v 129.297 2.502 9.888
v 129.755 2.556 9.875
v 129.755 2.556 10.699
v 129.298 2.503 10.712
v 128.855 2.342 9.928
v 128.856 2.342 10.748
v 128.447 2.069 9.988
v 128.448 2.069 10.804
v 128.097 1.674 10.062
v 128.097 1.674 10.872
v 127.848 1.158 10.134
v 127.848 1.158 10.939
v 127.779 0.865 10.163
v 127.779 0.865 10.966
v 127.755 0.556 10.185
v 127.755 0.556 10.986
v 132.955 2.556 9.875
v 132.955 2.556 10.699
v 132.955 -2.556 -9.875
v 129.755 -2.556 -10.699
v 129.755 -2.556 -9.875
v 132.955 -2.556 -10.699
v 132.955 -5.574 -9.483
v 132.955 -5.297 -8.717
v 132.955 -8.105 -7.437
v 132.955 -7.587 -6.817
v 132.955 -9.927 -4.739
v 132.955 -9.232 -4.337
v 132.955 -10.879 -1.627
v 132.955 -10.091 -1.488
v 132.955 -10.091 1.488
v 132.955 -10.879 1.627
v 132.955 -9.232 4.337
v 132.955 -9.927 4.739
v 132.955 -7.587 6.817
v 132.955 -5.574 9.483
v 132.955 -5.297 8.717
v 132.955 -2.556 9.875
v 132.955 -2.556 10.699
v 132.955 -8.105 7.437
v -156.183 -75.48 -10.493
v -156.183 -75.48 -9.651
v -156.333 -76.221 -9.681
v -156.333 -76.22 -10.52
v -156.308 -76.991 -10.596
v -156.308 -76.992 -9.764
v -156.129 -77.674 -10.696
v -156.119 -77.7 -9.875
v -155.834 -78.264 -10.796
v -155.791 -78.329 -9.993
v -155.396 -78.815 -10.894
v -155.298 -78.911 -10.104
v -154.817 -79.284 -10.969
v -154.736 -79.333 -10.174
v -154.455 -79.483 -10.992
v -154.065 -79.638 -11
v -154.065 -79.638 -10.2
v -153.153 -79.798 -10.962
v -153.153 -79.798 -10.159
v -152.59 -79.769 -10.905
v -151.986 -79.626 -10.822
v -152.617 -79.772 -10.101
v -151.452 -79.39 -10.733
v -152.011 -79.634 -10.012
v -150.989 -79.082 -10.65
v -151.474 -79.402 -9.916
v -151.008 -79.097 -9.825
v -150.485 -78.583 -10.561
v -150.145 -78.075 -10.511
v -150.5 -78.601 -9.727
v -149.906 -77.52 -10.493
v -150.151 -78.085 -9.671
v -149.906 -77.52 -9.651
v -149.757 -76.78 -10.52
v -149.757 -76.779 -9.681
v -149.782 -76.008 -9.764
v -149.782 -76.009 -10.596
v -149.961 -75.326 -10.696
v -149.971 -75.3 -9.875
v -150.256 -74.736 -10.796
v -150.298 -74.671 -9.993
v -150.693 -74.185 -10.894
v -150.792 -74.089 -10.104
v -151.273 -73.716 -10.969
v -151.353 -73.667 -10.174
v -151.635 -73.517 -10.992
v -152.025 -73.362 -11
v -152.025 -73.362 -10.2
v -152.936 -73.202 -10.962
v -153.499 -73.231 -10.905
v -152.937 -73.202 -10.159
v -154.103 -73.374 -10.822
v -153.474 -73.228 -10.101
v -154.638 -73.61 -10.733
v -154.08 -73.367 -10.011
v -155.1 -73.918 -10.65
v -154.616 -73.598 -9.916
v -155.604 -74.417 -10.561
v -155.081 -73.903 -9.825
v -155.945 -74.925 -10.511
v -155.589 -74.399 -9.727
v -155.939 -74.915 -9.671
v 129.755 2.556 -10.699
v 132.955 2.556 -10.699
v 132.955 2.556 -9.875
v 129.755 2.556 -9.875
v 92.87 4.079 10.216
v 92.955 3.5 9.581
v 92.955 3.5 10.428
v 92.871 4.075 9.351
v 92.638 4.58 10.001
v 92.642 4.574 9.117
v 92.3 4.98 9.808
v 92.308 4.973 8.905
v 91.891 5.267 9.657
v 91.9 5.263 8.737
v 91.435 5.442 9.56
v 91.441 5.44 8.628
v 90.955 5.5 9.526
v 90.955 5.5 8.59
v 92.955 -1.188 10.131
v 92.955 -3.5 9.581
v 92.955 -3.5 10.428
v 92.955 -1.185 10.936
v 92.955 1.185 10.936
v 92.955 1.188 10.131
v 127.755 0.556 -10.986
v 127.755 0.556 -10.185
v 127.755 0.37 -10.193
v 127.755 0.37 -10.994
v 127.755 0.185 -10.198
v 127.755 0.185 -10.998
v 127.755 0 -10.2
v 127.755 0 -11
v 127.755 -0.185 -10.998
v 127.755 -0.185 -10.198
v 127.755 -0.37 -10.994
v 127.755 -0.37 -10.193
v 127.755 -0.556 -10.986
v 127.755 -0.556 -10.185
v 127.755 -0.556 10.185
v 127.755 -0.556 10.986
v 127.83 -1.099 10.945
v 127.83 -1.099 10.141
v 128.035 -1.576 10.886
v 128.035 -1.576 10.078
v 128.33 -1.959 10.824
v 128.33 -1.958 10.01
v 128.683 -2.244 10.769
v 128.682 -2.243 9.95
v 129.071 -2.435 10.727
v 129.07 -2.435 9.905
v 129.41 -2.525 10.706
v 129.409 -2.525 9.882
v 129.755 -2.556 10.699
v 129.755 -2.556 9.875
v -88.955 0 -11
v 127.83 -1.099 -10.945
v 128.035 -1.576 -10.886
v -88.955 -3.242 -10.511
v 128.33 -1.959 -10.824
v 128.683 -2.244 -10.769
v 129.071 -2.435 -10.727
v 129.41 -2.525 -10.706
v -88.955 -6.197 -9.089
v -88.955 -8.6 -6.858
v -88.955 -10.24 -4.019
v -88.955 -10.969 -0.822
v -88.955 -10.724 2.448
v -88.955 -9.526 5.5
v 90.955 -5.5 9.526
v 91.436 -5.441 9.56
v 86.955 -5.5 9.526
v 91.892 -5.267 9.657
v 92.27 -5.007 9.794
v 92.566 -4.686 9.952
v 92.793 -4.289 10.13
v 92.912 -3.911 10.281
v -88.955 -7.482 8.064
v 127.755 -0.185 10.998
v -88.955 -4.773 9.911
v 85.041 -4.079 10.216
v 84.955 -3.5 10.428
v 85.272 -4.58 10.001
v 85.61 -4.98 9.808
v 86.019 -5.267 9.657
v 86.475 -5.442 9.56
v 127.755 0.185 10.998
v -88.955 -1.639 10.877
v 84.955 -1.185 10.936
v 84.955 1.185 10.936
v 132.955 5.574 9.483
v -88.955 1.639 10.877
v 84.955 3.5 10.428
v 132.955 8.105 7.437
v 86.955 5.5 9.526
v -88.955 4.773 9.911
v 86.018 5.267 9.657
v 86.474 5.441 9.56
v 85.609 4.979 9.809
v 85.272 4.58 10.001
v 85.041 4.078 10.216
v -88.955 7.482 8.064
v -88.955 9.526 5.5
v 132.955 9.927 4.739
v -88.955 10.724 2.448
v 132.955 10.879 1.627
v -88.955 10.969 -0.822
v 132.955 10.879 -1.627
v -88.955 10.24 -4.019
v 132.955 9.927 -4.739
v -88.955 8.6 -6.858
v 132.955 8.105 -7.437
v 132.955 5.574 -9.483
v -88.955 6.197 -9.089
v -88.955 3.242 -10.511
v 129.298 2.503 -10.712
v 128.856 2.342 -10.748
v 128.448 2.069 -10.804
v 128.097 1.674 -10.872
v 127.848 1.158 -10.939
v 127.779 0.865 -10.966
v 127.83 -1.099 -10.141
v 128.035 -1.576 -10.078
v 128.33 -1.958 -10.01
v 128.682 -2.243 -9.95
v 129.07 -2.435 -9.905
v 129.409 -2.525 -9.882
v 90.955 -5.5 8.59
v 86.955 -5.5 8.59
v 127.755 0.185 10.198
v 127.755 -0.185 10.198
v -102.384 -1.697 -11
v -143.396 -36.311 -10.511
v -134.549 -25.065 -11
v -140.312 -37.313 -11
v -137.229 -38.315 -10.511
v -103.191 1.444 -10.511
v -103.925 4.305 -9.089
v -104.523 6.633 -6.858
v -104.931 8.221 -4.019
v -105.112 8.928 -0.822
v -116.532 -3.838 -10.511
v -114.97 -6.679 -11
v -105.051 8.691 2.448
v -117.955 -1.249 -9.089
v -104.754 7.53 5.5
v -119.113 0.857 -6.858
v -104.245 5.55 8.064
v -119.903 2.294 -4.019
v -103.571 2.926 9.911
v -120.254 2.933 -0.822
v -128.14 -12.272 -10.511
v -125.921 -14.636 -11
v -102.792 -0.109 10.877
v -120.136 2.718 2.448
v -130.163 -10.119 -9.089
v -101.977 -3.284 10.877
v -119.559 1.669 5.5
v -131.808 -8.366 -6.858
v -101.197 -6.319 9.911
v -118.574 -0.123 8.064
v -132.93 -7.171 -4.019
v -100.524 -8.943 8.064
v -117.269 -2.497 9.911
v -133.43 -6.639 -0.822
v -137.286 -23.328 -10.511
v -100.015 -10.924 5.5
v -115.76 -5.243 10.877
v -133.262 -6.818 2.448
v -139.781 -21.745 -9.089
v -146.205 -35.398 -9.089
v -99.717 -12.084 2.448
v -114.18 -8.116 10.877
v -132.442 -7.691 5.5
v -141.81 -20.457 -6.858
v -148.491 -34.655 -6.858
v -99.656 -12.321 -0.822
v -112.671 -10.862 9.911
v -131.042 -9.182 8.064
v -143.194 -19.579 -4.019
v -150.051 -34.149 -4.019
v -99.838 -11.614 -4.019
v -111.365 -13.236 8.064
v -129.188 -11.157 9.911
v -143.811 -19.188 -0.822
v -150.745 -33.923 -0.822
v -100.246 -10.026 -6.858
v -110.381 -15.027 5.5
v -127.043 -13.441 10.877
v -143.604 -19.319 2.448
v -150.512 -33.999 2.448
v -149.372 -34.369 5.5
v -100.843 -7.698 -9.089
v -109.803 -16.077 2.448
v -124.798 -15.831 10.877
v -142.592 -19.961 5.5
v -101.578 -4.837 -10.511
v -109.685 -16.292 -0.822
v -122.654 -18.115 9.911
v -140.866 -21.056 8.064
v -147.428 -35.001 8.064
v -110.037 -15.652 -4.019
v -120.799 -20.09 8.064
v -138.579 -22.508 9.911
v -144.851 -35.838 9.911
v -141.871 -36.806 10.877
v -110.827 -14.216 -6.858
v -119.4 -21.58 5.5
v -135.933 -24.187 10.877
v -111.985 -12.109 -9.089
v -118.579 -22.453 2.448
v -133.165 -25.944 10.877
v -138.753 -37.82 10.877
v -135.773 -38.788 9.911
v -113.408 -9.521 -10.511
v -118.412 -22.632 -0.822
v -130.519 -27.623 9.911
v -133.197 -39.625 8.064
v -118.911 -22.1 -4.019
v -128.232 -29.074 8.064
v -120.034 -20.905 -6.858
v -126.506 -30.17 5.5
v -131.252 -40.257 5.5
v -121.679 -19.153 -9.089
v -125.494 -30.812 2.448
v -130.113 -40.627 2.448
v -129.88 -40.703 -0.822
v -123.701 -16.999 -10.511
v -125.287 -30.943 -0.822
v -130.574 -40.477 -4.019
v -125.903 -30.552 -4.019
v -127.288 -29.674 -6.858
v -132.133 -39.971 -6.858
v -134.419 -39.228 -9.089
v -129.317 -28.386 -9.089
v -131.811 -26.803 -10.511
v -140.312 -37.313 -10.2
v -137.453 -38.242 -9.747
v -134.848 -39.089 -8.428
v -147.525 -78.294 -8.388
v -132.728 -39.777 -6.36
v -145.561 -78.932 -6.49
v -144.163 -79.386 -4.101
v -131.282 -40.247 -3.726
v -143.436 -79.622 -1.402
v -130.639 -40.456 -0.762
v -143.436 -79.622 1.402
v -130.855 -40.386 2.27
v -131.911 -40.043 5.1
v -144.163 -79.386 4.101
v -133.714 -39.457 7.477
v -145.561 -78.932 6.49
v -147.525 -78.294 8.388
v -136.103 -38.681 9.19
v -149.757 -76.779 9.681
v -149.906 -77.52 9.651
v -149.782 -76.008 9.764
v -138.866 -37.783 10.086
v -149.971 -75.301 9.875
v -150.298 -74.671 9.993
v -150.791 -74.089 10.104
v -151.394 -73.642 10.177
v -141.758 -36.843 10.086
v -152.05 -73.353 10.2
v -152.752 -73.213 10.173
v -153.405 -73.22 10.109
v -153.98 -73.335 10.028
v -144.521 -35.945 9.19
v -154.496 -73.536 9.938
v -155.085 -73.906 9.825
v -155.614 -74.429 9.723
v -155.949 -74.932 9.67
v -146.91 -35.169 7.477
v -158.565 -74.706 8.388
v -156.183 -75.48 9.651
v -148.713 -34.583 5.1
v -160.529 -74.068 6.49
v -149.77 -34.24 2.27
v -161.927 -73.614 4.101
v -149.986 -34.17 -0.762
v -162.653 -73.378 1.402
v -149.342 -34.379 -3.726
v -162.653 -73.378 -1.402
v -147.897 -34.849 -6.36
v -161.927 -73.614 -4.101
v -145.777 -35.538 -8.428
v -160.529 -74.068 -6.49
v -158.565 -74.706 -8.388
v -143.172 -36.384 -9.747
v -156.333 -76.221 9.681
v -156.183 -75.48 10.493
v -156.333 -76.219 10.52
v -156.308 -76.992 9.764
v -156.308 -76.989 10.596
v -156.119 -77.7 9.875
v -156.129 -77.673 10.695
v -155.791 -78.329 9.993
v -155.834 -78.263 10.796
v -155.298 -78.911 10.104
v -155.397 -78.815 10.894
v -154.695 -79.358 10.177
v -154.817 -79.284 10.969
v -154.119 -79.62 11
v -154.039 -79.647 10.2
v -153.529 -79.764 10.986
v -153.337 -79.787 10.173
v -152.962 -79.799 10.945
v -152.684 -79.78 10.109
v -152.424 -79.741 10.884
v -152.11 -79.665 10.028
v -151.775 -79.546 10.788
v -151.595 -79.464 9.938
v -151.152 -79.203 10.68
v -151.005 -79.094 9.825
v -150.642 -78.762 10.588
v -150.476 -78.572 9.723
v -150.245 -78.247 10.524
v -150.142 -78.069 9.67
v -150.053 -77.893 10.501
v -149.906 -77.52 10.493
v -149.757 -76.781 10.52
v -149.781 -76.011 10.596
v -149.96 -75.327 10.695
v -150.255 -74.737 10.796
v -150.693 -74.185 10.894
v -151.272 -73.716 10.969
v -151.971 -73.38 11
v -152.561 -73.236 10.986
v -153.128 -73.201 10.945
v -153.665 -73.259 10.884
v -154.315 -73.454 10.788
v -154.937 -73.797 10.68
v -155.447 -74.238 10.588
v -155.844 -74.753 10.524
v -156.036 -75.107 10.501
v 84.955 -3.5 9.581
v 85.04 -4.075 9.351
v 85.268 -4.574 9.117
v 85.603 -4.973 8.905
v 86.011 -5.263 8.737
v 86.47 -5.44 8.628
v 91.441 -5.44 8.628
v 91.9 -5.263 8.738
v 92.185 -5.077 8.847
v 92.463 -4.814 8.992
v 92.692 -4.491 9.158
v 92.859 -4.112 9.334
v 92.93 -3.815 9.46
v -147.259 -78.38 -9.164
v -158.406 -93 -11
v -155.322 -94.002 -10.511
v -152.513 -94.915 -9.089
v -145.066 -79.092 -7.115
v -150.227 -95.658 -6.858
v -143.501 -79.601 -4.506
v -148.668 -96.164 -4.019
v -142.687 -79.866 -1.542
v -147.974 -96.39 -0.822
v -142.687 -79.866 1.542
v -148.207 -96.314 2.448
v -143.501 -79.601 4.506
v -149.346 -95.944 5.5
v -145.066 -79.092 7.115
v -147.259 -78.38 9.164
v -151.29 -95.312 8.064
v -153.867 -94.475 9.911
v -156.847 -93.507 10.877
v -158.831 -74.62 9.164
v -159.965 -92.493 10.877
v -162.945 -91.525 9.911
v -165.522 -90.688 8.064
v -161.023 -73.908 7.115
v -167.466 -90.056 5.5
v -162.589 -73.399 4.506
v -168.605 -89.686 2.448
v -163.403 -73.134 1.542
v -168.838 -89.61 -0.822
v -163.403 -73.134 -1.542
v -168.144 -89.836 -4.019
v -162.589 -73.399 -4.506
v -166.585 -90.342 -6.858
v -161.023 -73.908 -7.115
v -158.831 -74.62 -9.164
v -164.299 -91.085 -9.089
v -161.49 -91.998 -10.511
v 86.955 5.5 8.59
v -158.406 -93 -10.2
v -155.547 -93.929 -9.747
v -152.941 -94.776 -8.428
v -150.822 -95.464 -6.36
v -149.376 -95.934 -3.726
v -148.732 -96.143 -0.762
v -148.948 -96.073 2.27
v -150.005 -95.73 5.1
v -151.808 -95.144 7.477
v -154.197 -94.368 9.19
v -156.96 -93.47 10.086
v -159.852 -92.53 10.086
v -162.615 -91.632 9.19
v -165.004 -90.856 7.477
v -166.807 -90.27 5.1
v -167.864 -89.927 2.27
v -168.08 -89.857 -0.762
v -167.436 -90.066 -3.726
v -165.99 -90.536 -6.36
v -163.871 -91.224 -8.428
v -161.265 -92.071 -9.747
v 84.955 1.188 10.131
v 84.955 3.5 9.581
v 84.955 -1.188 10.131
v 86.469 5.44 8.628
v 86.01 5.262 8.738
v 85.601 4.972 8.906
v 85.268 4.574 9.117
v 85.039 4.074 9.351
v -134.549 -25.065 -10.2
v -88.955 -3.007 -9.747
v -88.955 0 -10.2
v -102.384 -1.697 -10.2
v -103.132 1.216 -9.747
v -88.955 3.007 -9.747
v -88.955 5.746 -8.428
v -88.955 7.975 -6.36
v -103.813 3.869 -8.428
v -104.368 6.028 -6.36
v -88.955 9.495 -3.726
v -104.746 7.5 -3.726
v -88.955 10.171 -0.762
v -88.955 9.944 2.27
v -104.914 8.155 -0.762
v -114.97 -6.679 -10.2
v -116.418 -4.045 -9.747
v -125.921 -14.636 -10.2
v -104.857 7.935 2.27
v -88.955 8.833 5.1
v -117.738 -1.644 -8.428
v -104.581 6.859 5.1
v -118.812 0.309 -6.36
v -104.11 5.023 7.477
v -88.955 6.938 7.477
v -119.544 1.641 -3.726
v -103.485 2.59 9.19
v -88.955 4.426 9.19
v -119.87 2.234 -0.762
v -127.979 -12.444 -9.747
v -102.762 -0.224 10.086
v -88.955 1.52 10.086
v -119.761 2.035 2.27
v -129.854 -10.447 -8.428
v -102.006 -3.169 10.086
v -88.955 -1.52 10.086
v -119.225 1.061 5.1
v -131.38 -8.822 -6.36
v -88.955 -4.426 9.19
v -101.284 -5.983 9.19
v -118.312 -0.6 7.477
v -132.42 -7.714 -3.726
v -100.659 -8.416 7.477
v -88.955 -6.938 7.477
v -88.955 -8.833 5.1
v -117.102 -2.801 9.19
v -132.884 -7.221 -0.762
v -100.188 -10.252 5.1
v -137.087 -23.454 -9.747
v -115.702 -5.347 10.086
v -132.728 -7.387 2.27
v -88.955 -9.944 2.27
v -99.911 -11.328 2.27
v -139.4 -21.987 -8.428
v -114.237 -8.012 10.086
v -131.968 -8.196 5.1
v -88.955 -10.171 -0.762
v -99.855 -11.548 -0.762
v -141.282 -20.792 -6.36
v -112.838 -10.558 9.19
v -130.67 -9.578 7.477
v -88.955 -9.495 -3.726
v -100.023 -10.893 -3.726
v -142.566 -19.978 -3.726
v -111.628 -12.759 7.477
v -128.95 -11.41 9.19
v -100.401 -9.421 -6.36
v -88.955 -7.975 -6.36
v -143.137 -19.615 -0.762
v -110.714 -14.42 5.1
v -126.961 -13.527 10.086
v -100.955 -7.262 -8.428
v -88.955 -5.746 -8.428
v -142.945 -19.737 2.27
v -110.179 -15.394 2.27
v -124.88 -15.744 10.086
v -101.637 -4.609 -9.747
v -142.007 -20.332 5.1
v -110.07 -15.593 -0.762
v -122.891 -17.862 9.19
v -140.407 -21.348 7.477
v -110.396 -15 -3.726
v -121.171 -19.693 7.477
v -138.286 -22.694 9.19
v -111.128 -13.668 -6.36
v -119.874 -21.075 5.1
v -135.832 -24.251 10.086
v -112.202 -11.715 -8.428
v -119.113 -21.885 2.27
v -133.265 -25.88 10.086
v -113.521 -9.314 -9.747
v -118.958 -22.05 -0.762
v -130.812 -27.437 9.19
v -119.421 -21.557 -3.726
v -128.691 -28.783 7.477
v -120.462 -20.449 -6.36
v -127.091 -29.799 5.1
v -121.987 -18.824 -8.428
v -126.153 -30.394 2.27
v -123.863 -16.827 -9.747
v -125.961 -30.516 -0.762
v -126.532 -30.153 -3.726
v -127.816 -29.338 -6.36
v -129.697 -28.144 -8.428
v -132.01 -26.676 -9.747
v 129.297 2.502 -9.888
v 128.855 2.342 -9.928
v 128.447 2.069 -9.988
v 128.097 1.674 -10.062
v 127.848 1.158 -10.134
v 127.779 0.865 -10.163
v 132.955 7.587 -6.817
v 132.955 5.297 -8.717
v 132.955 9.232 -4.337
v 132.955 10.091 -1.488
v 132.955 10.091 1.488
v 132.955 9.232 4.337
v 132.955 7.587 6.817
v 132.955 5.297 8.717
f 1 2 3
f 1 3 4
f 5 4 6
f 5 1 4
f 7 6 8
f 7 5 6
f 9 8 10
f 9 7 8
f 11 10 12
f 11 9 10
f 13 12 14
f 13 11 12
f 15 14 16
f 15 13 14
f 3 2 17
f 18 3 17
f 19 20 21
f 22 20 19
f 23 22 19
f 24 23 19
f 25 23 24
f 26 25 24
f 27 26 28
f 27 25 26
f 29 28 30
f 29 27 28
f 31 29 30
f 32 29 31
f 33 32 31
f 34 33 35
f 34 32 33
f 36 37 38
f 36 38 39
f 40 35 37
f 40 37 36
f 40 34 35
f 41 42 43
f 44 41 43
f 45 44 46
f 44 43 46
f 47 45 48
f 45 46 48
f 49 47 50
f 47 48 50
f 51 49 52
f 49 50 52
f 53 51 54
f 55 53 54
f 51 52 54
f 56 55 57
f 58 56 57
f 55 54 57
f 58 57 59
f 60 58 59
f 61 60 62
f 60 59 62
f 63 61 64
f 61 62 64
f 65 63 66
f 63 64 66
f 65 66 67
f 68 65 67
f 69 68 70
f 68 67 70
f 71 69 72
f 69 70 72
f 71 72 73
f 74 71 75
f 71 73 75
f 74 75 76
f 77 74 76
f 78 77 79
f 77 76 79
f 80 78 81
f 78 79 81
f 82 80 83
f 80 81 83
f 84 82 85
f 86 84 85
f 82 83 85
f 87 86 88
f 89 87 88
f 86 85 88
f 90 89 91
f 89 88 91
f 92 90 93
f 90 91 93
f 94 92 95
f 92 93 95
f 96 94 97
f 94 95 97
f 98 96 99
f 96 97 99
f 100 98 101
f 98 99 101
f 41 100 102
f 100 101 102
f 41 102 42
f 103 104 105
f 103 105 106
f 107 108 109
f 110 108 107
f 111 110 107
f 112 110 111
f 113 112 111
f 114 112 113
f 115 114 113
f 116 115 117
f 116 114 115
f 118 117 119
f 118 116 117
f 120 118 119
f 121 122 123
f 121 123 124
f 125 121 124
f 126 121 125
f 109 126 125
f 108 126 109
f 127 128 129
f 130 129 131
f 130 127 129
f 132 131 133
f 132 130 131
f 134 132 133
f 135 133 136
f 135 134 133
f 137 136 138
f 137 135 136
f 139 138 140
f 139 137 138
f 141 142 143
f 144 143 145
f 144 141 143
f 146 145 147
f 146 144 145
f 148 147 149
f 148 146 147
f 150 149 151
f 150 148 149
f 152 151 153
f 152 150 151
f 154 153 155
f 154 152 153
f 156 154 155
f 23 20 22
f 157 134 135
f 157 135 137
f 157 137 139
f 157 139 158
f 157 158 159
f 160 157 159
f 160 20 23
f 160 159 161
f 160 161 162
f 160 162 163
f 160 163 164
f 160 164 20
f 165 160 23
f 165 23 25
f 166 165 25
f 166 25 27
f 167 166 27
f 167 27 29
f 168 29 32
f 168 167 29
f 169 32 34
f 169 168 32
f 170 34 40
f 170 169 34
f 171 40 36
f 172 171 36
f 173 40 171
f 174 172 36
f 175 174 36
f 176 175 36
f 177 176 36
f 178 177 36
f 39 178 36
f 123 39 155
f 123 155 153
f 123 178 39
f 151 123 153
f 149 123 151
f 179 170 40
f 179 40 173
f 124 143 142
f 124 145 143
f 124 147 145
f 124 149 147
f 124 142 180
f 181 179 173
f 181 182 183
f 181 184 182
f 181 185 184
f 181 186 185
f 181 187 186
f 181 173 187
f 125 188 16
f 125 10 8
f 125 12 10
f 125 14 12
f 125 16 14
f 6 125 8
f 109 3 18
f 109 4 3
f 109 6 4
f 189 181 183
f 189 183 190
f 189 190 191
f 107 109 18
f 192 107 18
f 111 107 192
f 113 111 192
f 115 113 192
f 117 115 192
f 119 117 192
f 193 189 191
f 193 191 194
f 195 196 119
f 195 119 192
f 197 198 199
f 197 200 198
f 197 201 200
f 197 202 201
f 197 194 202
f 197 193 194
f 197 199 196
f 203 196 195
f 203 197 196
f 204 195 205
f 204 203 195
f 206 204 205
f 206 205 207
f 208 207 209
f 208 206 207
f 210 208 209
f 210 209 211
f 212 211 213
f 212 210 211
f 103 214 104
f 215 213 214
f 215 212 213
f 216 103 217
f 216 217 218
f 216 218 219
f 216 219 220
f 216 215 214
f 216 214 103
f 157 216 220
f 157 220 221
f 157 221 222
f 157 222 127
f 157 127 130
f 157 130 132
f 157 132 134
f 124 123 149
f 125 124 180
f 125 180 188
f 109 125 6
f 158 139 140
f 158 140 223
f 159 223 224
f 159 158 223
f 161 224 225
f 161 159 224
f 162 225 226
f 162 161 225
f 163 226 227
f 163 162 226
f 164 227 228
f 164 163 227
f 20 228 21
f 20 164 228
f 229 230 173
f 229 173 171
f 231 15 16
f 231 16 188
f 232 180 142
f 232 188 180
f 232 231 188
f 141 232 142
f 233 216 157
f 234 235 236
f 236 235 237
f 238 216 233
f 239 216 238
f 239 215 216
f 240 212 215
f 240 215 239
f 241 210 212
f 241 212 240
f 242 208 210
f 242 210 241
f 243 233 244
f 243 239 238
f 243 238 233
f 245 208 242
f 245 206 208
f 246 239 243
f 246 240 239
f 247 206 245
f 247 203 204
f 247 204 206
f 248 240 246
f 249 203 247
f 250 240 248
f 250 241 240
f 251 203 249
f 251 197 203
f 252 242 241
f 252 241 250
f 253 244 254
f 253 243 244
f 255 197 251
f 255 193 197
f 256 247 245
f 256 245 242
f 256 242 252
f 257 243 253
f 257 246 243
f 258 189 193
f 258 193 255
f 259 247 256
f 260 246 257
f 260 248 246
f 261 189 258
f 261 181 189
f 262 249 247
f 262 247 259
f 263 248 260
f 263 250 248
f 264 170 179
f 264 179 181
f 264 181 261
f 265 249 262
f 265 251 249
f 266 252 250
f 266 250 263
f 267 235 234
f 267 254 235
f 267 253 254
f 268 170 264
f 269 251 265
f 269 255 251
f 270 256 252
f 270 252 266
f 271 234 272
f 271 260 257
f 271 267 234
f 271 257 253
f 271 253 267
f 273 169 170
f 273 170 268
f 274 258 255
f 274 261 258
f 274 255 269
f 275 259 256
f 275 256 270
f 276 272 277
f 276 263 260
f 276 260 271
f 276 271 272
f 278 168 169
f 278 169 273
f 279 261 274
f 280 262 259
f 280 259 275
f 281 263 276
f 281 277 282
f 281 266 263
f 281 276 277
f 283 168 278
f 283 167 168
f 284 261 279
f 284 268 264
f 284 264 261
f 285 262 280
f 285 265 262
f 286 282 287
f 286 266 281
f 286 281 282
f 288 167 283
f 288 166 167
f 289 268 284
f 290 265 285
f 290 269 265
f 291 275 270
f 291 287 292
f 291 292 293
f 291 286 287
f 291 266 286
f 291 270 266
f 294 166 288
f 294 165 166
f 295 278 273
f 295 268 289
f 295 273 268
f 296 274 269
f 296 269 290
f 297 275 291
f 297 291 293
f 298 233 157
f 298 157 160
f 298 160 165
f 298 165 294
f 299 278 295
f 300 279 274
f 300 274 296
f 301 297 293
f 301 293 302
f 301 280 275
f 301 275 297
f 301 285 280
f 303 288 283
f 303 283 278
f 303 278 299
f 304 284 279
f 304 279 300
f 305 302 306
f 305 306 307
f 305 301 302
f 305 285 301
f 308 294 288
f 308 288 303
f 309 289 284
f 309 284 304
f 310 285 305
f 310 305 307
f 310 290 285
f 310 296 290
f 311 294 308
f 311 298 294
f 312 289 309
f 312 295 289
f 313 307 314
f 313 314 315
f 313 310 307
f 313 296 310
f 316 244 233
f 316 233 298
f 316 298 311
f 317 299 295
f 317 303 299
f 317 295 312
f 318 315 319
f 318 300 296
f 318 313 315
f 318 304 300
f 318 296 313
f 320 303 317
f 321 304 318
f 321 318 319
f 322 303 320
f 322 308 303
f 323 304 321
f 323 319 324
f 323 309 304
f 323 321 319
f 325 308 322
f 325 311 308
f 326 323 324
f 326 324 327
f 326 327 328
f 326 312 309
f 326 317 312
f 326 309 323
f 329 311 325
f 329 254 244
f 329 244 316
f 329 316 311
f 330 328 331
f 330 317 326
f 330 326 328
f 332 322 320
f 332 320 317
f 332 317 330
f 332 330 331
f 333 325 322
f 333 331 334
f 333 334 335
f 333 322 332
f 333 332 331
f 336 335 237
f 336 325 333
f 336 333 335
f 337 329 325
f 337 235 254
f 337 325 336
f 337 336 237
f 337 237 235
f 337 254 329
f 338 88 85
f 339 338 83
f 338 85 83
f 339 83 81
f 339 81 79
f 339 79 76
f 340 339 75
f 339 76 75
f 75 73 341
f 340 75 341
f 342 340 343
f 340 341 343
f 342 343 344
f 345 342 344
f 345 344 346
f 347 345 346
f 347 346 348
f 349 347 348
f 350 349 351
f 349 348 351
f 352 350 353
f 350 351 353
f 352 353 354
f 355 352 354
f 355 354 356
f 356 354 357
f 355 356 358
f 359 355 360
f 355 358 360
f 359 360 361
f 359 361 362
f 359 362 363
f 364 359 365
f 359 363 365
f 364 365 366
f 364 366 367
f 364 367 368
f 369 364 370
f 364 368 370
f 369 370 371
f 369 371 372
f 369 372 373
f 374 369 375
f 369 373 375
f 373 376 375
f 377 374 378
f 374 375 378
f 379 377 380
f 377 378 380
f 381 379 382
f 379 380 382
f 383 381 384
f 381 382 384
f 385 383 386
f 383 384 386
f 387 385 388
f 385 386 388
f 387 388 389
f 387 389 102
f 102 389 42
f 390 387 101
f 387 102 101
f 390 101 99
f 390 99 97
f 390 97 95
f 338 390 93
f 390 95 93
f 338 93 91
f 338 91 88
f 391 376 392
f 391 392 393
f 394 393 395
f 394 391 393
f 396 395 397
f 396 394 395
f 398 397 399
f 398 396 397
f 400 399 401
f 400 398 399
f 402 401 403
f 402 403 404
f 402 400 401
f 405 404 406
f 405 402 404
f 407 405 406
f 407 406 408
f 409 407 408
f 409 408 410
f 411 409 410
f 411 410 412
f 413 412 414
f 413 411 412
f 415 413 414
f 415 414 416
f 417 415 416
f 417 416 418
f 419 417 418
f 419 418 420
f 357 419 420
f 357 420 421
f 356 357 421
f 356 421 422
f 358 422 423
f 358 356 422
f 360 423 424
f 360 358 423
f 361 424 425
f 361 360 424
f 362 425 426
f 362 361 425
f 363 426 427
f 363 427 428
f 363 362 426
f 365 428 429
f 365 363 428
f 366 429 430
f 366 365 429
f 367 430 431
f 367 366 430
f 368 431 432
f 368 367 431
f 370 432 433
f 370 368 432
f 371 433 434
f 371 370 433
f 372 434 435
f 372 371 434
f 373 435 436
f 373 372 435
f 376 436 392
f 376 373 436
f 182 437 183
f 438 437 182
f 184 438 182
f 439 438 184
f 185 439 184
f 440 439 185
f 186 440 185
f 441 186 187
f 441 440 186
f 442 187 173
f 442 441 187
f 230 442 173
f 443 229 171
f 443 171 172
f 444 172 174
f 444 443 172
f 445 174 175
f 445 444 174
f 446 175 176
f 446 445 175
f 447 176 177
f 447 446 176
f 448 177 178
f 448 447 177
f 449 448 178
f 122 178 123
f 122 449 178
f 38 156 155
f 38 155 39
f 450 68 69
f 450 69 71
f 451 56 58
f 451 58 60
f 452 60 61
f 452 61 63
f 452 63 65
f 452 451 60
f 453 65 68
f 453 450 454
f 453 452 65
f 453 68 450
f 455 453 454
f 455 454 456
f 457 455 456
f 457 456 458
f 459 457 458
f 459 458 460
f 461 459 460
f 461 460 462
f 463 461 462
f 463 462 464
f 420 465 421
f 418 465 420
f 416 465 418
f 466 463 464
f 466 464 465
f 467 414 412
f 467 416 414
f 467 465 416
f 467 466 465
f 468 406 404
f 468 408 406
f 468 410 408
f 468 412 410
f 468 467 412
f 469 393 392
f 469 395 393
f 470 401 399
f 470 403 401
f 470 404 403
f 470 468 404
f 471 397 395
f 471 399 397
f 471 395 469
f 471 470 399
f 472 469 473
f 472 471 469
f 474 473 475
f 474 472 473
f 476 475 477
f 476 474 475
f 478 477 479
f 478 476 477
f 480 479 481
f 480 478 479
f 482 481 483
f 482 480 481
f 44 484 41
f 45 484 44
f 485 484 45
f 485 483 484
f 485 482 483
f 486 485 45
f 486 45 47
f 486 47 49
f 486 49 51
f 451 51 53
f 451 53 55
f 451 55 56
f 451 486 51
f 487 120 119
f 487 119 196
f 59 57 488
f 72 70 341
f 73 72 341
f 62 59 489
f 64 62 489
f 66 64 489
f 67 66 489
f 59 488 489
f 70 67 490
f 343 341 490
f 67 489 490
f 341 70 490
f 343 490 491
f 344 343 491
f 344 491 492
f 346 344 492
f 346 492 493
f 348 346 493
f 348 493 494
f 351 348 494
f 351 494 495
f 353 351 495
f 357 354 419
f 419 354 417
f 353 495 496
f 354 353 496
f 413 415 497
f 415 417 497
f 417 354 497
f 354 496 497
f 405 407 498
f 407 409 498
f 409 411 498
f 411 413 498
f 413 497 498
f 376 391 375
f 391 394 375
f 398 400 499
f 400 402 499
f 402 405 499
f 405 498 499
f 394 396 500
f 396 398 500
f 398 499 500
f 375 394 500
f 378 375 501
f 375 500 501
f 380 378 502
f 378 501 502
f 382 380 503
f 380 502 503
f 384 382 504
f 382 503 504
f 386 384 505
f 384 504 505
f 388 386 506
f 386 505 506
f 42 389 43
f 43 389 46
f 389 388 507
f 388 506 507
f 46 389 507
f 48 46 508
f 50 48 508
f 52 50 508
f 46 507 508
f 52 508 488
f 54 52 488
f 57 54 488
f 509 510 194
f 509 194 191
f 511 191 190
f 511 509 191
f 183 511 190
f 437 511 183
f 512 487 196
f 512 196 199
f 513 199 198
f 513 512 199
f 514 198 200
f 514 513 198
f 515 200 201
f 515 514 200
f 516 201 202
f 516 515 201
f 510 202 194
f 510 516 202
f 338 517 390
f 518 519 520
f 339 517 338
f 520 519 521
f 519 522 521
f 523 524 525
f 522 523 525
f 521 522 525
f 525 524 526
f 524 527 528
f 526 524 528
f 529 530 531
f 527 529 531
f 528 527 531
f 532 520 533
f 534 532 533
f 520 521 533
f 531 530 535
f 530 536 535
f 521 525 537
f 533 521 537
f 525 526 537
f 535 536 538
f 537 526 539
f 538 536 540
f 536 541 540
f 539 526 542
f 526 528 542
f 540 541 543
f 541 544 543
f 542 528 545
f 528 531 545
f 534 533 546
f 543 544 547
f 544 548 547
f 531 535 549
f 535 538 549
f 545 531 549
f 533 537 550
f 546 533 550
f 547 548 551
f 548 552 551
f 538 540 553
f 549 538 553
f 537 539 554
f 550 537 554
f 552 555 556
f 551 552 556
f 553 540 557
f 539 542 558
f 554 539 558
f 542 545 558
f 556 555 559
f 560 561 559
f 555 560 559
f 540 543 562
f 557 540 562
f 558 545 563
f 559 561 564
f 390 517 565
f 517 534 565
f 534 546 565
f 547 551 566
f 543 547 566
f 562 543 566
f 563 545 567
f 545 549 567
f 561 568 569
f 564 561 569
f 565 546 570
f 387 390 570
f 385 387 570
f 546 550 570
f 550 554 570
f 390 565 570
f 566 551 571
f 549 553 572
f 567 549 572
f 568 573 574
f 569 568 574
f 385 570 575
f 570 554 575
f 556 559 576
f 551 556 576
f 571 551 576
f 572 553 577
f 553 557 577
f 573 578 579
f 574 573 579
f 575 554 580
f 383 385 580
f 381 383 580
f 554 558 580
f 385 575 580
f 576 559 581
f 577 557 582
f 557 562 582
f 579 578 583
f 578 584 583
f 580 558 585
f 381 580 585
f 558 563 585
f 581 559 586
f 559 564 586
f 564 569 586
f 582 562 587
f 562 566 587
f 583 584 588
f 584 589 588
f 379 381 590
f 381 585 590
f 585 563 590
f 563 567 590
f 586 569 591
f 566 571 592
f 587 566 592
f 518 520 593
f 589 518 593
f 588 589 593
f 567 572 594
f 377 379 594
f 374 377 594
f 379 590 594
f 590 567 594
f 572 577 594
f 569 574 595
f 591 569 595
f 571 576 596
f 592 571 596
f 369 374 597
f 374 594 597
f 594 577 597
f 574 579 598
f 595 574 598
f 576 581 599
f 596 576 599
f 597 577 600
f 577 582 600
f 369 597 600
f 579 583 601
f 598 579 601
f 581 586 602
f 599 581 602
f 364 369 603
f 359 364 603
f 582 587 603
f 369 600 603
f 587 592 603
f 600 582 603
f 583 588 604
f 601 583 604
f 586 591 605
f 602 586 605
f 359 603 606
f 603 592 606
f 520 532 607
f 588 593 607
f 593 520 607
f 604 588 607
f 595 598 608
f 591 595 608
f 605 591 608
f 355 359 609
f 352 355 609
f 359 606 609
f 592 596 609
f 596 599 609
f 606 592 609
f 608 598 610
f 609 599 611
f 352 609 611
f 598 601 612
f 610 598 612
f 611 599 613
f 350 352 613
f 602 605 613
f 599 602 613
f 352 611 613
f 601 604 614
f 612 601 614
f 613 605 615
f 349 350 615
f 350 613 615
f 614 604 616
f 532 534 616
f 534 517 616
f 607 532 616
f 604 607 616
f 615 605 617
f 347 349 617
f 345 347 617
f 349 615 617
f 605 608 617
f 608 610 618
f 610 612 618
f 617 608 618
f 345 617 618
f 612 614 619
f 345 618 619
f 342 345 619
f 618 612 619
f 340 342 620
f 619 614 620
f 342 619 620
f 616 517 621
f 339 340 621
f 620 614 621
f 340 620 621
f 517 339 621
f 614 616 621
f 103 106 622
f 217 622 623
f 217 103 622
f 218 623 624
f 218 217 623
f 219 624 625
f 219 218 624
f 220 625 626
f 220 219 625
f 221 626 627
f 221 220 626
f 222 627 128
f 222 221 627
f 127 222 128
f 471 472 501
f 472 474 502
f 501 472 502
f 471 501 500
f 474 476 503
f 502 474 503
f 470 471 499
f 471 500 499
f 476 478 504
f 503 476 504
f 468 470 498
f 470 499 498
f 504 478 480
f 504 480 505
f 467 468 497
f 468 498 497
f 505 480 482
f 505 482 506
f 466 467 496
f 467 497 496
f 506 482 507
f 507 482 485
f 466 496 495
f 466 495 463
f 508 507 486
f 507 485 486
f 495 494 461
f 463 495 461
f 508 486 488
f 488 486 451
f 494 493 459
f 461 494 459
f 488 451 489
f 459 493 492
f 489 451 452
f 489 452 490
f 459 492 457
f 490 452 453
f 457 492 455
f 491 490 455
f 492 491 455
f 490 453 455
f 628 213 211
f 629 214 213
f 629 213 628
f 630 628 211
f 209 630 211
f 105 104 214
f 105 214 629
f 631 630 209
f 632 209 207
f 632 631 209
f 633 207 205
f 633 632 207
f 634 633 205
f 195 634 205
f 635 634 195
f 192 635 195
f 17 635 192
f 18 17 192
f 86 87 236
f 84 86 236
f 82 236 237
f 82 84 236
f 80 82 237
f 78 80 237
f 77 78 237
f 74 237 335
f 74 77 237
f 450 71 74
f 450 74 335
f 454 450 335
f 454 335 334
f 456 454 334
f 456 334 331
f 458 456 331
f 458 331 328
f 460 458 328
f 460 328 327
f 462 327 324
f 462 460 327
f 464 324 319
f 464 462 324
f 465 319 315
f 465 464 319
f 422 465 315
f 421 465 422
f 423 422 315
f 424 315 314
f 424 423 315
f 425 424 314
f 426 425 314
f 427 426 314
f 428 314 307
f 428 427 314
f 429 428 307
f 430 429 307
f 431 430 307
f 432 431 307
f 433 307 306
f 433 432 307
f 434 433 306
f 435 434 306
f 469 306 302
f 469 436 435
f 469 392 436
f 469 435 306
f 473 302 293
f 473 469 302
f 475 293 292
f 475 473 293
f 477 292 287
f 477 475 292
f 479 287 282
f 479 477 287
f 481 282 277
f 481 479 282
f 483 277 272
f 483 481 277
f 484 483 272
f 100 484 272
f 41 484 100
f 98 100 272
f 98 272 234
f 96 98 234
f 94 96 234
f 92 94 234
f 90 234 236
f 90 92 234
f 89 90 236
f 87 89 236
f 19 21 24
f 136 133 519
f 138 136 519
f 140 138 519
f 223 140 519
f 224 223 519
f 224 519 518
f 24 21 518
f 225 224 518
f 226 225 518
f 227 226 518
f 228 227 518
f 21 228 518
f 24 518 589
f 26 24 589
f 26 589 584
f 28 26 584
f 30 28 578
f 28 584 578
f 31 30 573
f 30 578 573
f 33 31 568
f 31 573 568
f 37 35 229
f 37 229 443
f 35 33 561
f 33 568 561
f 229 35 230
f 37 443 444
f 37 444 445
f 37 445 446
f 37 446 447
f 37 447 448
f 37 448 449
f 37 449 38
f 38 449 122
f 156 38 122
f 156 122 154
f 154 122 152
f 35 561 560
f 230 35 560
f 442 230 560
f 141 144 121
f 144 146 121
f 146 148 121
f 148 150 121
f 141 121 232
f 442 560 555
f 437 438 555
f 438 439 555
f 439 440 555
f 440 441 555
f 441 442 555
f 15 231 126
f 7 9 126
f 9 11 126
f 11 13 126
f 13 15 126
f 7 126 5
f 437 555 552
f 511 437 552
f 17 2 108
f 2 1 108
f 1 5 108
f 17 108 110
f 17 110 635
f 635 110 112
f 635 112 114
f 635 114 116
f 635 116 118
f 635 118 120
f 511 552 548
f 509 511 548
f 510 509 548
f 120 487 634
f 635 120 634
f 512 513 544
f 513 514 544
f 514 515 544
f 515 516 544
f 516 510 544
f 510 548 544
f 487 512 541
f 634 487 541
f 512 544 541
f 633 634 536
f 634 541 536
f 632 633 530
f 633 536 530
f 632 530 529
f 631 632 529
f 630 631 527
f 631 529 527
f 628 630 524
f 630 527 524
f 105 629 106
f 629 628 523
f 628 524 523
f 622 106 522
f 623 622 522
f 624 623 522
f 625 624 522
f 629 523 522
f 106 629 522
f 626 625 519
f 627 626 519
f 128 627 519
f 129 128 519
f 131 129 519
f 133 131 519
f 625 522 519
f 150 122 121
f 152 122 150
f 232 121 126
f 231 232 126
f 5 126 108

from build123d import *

# Parameters (mm, degrees)
SKETCH3_R               = 11
SKETCH3_R_2             = 10.2
CUT_EXTRUDE1_REACH      = 196.756
SKETCH4_R               = 3.3
SKETCH5_R               = 3.3
CUT_EXTRUDE2_DEPTH      = 195.756456884
CUT_EXTRUDE3_DEPTH      = 195.756456884
CUT_EXTRUDE3_DEPTH_BACK = 195.756456884


with BuildPart() as part:
    # Sweep2: sweep along a path in Sketch1
    with BuildLine(Plane.XY) as sweep2_path:
        Line((132.955173363, 0), (88.955173363, 0))
        Line((88.955173363, 0), (-88.955173363, 0))
        ThreePointArc((-88.955173363, 0), (-120.695576987, -10.313082304), (-140.312225243, -37.313082304))
        Line((-140.312225243, -37.313082304), (-153.044826637, -76.5))
        Line((-153.044826637, -76.5), (-158.406001625, -93))
    # Sketch3 → Sweep2 (sweep)
    with BuildSketch(Plane(origin=(88.955173363, 0, 0), x_dir=(0, 0, -1), z_dir=(1, 0, 0))):
        Circle(SKETCH3_R)
        Circle(SKETCH3_R_2, mode=Mode.SUBTRACT)
    sweep(path=sweep2_path.line)

    # Sketch4 → Cut-Extrude1 (cut, up to next)
    with BuildSketch(Plane.XY, mode=Mode.PRIVATE) as cut_extrude1_sk1:
        with Locations((-153.044826637, -76.5)):
            Circle(SKETCH4_R)
    cut_extrude1_tool1 = extrude(cut_extrude1_sk1.sketch, amount=CUT_EXTRUDE1_REACH, mode=Mode.PRIVATE) & part.part
    # Sketch4 → Cut-Extrude1 (cut, up to next)
    with BuildSketch(Plane.XY, mode=Mode.PRIVATE) as cut_extrude1_sk2:
        with BuildLine():
            Line((133.739588828, 2.555545653), (133.739588828, -2.555545653))
            Line((133.739588828, -2.555545653), (130.539588828, -2.555545653))
            ThreePointArc((130.539588828, -2.555545653), (129.125375266, -1.969759216), (128.539588828, -0.555545653))
            Line((128.539588828, -0.555545653), (128.539588828, 0.555545653))
            ThreePointArc((128.539588828, 0.555545653), (129.125375266, 1.969759216), (130.539588828, 2.555545653))
            Line((130.539588828, 2.555545653), (133.739588828, 2.555545653))
        make_face()
    cut_extrude1_tool2 = extrude(cut_extrude1_sk2.sketch, amount=CUT_EXTRUDE1_REACH, mode=Mode.PRIVATE) & part.part
    # Sketch4 → Cut-Extrude1 (cut, up to next)
    with BuildSketch(Plane.XY, mode=Mode.PRIVATE) as cut_extrude1_sk3:
        with BuildLine():
            Line((86.955173363, -5.5), (90.955173363, -5.5))
            ThreePointArc((90.955173363, -5.5), (92.369386925, -4.914213562), (92.955173363, -3.5))
            Line((92.955173363, -3.5), (92.955173363, 3.5))
            ThreePointArc((92.955173363, 3.5), (92.369386925, 4.914213562), (90.955173363, 5.5))
            Line((90.955173363, 5.5), (86.955173363, 5.5))
            ThreePointArc((86.955173363, 5.5), (85.540959801, 4.914213562), (84.955173363, 3.5))
            Line((84.955173363, 3.5), (84.955173363, -3.5))
            ThreePointArc((84.955173363, -3.5), (85.540959801, -4.914213562), (86.955173363, -5.5))
        make_face()
    cut_extrude1_tool3 = extrude(cut_extrude1_sk3.sketch, amount=CUT_EXTRUDE1_REACH, mode=Mode.PRIVATE) & part.part
    add(cut_extrude1_tool1.solids().sort_by_distance((-153.044827, -76.5, 0))[0], mode=Mode.SUBTRACT)
    add(cut_extrude1_tool2.solids().sort_by_distance((131.288287, 0, 0))[0], mode=Mode.SUBTRACT)
    add(cut_extrude1_tool3.solids().sort_by_distance((88.955173, 0, 0))[0], mode=Mode.SUBTRACT)

    # Sketch5 → Cut-Extrude2 (cut, through all)
    with BuildSketch(Plane.XY):
        with Locations((-153.044826637, -76.5)):
            Circle(SKETCH5_R)
    extrude(amount=-CUT_EXTRUDE2_DEPTH, mode=Mode.SUBTRACT)

    # Sketch6 → Cut-Extrude3 (cut, two sides: drawn at the far end of the back side and taken through both)
    with BuildSketch(Plane.XY.offset(-CUT_EXTRUDE3_DEPTH_BACK)):
        with BuildLine():
            Line((132.955173363, 2.555545653), (129.755173363, 2.555545653))
            ThreePointArc((129.755173363, 2.555545653), (128.340959801, 1.969759216), (127.755173363, 0.555545653))
            Line((127.755173363, 0.555545653), (127.755173363, -0.555545653))
            ThreePointArc((127.755173363, -0.555545653), (128.340959801, -1.969759216), (129.755173363, -2.555545653))
            Line((129.755173363, -2.555545653), (132.955173363, -2.555545653))
            Line((132.955173363, -2.555545653), (132.955173363, 2.555545653))
        make_face()
    extrude(amount=CUT_EXTRUDE3_DEPTH + CUT_EXTRUDE3_DEPTH_BACK, mode=Mode.SUBTRACT)


solid = part.part
